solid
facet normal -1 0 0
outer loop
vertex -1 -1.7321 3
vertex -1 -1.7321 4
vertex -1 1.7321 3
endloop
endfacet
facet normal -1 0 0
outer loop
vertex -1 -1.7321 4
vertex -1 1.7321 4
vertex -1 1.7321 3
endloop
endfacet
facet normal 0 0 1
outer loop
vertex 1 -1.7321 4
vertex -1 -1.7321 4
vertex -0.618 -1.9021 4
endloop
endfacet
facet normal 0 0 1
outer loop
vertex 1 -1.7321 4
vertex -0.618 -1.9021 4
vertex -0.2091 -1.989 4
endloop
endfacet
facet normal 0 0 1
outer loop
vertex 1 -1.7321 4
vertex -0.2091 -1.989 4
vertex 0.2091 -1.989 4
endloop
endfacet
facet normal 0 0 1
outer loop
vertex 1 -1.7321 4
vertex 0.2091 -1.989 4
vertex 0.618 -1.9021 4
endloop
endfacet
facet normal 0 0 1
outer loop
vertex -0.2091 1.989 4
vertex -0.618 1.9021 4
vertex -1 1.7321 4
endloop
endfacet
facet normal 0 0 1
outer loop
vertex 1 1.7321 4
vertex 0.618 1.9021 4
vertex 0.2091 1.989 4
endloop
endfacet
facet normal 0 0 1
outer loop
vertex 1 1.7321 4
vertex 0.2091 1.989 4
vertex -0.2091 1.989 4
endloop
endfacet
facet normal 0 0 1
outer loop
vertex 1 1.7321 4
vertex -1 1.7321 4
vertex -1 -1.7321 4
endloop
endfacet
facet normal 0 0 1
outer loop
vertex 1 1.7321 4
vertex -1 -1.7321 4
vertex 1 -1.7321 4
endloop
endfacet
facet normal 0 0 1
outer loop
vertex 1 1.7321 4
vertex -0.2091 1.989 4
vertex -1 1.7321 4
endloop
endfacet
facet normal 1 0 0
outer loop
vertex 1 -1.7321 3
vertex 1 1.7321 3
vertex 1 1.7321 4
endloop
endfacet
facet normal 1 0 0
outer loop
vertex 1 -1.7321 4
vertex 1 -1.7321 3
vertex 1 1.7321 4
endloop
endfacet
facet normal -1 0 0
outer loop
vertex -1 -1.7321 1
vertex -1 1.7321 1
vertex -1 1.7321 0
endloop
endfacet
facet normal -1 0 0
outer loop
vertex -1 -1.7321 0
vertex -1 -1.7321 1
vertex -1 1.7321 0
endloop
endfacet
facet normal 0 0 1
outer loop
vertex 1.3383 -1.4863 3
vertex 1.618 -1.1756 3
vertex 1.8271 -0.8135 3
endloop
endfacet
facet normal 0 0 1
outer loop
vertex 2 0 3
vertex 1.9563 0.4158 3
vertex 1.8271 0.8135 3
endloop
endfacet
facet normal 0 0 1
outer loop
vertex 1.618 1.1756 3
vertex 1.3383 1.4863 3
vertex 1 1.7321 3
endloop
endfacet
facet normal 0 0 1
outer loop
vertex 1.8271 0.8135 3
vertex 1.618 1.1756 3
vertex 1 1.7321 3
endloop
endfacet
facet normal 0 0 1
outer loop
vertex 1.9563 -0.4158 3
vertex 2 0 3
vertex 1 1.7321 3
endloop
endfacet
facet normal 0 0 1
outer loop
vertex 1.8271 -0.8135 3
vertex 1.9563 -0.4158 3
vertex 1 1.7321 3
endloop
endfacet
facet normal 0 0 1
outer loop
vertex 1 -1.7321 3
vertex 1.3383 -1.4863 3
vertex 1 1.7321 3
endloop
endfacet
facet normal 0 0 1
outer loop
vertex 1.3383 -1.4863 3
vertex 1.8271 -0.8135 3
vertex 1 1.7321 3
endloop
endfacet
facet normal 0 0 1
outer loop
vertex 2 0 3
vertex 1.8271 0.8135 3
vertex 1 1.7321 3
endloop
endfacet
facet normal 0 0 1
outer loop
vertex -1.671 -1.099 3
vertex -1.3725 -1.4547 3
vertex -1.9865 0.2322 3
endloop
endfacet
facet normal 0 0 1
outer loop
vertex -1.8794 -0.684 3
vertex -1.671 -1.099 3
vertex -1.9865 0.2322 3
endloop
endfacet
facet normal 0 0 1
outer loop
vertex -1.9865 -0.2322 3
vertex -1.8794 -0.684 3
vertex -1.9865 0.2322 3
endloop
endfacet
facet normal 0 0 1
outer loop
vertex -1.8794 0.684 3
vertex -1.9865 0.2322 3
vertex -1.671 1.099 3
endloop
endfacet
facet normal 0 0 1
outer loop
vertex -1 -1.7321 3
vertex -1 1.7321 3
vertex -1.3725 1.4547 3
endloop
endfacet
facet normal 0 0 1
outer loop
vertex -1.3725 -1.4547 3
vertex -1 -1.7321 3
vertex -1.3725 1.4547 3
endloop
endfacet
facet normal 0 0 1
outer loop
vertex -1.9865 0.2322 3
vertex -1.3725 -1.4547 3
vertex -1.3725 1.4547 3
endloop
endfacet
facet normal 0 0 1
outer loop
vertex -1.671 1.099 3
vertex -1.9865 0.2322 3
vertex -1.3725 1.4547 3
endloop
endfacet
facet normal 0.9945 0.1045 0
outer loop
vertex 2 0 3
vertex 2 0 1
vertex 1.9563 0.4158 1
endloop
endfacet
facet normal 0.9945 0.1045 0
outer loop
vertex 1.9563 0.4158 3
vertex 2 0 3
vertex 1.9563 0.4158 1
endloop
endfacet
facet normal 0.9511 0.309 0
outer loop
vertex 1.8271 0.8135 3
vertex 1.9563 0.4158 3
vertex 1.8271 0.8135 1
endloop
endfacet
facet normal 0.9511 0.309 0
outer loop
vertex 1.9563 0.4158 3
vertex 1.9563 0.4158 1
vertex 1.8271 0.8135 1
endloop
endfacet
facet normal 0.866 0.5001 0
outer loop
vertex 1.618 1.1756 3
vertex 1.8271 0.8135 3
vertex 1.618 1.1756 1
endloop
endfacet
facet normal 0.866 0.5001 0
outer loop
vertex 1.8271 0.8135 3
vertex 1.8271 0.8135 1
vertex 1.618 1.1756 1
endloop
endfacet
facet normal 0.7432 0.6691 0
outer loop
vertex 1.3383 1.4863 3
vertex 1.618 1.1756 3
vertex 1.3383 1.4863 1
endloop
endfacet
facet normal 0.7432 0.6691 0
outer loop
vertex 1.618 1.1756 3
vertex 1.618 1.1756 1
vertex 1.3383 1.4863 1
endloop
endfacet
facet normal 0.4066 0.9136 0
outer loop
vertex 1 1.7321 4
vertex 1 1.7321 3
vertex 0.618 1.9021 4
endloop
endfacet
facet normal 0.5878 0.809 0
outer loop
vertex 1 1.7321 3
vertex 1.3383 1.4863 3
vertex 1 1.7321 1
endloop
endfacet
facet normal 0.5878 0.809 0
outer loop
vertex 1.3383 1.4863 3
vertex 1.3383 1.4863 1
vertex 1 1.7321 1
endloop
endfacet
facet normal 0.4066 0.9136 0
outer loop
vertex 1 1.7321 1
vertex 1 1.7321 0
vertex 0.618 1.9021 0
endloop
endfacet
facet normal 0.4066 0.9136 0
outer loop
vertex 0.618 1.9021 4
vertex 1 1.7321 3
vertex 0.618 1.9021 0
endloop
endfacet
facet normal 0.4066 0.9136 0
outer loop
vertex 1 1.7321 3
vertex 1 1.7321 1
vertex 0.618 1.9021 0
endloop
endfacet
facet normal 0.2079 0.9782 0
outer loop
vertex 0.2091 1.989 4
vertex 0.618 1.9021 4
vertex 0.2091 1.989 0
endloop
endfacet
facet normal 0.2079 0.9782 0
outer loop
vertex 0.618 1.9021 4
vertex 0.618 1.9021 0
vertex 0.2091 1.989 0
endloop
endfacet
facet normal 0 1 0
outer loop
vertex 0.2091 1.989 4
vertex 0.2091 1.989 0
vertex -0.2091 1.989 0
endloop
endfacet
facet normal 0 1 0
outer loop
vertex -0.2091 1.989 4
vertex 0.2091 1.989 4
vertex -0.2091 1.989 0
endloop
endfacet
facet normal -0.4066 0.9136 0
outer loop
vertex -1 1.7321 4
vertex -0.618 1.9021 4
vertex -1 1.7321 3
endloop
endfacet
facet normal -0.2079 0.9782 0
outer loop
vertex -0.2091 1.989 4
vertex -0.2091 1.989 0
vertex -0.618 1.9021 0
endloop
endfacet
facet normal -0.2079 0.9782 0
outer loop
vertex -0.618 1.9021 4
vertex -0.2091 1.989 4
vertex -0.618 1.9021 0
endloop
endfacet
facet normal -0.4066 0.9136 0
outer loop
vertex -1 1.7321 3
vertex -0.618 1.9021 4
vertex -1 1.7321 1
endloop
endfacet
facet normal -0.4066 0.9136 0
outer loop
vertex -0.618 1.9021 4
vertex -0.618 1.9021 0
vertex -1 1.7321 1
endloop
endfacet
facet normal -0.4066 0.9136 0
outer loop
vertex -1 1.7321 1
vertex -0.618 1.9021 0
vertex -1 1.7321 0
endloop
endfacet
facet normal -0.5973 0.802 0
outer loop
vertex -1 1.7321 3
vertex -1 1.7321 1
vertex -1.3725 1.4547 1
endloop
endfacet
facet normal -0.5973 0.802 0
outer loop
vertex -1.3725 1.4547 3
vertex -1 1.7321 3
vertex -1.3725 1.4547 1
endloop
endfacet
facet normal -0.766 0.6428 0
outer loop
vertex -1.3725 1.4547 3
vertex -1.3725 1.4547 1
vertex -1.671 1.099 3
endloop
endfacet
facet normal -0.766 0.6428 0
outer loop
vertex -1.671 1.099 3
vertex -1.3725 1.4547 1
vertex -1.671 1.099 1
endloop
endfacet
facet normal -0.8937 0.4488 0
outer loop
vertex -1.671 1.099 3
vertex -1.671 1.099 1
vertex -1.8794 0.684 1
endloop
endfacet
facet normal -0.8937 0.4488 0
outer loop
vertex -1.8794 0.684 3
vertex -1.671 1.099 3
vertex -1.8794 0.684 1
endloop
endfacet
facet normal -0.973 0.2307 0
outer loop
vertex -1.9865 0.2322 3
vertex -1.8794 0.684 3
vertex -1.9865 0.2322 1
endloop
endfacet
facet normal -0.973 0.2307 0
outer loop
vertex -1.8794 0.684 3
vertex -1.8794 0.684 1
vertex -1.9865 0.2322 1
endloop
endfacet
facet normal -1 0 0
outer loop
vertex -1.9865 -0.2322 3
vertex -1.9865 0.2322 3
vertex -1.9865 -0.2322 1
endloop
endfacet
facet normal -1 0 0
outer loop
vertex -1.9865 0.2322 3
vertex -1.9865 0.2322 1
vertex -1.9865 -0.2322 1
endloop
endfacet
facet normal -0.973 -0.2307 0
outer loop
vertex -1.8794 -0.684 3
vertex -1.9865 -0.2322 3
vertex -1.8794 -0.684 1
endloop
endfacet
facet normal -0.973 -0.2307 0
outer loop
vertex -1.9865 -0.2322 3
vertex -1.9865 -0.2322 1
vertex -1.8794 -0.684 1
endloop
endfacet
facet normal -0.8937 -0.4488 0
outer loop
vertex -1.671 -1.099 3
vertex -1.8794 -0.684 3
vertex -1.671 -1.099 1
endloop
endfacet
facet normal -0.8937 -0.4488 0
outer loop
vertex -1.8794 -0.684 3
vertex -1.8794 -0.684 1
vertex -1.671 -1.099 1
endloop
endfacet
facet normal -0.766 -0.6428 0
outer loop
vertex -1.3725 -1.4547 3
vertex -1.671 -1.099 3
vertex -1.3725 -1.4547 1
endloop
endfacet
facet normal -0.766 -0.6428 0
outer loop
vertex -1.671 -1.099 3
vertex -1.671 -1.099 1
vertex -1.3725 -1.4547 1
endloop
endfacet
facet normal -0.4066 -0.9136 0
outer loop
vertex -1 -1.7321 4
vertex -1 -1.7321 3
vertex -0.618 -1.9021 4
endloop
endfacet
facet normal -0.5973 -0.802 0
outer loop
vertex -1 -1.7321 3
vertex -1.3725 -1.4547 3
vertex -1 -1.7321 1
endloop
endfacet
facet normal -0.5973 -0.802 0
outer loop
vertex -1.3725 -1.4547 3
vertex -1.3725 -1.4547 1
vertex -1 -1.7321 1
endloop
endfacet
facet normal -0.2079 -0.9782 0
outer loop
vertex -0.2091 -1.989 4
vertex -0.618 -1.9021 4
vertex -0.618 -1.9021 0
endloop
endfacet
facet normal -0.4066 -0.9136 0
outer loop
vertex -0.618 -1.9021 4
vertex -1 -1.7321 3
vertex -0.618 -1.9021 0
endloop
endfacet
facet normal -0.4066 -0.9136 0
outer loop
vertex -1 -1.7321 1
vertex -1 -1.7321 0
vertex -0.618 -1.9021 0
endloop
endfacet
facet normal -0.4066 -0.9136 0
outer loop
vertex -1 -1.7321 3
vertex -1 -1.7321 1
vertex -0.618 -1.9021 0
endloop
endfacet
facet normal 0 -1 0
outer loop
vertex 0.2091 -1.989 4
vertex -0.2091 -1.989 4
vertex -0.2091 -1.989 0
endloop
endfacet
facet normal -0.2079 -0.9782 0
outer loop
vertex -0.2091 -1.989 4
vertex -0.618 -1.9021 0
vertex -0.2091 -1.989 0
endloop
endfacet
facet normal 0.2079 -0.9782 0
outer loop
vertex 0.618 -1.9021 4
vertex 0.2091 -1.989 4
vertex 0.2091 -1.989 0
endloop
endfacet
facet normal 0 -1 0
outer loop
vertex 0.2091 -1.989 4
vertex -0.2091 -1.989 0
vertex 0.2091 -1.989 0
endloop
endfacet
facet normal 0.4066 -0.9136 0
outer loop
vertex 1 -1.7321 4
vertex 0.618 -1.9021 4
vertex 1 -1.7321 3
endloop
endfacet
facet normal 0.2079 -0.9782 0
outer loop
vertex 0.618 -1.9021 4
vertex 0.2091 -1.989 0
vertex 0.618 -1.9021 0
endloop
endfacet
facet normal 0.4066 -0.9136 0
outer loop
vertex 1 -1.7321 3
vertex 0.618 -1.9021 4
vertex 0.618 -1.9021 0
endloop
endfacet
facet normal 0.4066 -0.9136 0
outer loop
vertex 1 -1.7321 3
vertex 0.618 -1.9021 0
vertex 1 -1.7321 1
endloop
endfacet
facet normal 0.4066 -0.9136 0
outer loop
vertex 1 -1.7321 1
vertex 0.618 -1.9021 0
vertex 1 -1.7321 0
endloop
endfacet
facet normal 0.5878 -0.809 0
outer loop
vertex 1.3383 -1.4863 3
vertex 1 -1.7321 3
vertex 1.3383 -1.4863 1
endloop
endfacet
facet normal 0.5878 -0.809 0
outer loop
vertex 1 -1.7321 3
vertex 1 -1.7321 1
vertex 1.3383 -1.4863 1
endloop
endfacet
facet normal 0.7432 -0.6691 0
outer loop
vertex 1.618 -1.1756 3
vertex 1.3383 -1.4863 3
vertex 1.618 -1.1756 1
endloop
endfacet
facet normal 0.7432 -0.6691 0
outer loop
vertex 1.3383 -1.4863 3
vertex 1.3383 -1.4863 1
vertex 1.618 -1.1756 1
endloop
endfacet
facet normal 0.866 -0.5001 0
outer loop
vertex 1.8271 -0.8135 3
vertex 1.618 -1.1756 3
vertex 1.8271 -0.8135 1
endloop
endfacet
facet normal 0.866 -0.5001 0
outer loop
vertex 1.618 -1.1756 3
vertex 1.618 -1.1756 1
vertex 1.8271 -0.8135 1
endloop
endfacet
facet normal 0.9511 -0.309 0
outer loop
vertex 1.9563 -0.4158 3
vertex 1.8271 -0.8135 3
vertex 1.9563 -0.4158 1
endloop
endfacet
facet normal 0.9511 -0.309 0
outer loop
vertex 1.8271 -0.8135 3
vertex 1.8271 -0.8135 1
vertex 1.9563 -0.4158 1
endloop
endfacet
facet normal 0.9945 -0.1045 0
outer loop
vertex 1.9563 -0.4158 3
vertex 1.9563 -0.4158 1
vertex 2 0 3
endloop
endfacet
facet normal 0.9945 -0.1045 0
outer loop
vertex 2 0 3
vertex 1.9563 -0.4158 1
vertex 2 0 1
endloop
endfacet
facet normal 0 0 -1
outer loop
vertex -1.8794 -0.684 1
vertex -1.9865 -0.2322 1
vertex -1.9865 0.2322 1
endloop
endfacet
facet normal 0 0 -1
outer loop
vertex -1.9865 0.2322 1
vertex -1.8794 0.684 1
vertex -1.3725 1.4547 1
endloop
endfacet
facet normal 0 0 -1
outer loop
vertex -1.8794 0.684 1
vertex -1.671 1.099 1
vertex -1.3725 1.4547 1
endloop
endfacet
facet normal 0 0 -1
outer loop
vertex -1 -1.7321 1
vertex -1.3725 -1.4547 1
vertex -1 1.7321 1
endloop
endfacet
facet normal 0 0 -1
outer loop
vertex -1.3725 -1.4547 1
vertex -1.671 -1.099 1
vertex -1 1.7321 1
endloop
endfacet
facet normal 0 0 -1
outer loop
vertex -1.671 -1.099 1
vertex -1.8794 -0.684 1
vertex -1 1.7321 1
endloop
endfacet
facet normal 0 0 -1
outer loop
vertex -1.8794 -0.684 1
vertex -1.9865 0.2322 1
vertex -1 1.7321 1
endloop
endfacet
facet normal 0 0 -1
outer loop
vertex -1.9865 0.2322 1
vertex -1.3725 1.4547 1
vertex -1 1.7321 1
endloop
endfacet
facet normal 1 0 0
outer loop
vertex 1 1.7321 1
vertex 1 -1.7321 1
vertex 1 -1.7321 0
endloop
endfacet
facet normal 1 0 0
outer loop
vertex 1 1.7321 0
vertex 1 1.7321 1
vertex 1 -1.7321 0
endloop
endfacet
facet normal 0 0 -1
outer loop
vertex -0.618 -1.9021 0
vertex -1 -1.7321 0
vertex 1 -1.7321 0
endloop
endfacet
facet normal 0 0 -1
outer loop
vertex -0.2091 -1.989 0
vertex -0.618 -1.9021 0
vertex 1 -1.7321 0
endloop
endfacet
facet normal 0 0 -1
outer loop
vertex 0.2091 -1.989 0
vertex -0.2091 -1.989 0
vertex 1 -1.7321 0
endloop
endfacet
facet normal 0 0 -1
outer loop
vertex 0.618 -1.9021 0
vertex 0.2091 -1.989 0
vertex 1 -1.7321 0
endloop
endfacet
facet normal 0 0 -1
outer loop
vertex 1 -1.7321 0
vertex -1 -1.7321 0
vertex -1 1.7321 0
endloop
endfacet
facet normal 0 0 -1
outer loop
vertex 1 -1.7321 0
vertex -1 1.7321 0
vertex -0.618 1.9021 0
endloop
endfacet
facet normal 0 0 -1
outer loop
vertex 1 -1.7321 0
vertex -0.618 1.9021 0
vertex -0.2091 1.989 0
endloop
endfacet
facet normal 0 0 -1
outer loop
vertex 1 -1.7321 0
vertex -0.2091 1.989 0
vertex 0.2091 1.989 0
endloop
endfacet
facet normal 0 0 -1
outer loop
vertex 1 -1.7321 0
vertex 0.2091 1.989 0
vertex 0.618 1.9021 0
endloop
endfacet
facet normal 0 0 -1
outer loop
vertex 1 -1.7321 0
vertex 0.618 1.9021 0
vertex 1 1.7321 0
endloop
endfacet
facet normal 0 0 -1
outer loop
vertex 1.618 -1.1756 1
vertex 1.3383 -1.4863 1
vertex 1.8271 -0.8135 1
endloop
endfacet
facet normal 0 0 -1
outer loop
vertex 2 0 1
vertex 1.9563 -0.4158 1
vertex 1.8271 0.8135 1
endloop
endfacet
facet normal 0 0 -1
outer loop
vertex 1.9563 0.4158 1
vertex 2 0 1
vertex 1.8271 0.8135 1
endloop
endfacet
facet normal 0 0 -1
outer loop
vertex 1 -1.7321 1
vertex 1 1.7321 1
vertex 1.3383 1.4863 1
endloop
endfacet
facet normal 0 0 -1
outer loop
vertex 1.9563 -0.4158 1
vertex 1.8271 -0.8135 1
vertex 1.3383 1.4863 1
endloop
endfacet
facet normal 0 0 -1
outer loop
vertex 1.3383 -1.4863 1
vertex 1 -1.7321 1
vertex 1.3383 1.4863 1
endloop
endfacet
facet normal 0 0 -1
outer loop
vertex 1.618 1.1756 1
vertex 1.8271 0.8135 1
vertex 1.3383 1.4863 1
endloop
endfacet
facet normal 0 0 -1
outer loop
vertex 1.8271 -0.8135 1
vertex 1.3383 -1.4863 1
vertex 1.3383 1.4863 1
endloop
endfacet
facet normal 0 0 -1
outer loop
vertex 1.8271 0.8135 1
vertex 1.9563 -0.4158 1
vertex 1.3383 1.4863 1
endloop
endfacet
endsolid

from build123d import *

# Parameters (mm, degrees)
SKETCH1_R           = 2
BOSS_EXTRUDE1_DEPTH = 4
CUT_EXTRUDE1_DEPTH  = 5
SKETCH3_W           = 1
SKETCH3_H           = 1
CUT_EXTRUDE2_DEPTH  = 5


with BuildPart() as part:
    # Sketch1 → Boss-Extrude1 (new body)
    with BuildSketch(Plane.XY):
        Circle(SKETCH1_R)
    extrude(amount=BOSS_EXTRUDE1_DEPTH)

    # Sketch2 → Cut-Extrude1 (cut, symmetric)
    with BuildSketch(Plane(origin=(0, 0, 0), x_dir=(1, 0, 0), z_dir=(0, 1, 0))):
        Polygon((2, -3), (1, -3), (1, -4.221507546), (-1, -4.26455627), (-1, -3), (-2.31386892, -3), (-2.31386892, -1), (-1, -1), (-1, 0.234035397), (-2.586760402, 0.199881392), (-2.489753088, -4.306979917), (2, -4.619024092), (2.554571986, -4.221507546), align=None)
    extrude(amount=CUT_EXTRUDE1_DEPTH, both=True, mode=Mode.SUBTRACT)

    # Sketch3 → Cut-Extrude2 (cut, symmetric)
    with BuildSketch(Plane(origin=(0, 0, 0), x_dir=(1, 0, 0), z_dir=(0, 1, 0))):
        with Locations((1.5, -0.5)):
            Rectangle(SKETCH3_W, SKETCH3_H)
    extrude(amount=CUT_EXTRUDE2_DEPTH, both=True, mode=Mode.SUBTRACT)


solid = part.part
